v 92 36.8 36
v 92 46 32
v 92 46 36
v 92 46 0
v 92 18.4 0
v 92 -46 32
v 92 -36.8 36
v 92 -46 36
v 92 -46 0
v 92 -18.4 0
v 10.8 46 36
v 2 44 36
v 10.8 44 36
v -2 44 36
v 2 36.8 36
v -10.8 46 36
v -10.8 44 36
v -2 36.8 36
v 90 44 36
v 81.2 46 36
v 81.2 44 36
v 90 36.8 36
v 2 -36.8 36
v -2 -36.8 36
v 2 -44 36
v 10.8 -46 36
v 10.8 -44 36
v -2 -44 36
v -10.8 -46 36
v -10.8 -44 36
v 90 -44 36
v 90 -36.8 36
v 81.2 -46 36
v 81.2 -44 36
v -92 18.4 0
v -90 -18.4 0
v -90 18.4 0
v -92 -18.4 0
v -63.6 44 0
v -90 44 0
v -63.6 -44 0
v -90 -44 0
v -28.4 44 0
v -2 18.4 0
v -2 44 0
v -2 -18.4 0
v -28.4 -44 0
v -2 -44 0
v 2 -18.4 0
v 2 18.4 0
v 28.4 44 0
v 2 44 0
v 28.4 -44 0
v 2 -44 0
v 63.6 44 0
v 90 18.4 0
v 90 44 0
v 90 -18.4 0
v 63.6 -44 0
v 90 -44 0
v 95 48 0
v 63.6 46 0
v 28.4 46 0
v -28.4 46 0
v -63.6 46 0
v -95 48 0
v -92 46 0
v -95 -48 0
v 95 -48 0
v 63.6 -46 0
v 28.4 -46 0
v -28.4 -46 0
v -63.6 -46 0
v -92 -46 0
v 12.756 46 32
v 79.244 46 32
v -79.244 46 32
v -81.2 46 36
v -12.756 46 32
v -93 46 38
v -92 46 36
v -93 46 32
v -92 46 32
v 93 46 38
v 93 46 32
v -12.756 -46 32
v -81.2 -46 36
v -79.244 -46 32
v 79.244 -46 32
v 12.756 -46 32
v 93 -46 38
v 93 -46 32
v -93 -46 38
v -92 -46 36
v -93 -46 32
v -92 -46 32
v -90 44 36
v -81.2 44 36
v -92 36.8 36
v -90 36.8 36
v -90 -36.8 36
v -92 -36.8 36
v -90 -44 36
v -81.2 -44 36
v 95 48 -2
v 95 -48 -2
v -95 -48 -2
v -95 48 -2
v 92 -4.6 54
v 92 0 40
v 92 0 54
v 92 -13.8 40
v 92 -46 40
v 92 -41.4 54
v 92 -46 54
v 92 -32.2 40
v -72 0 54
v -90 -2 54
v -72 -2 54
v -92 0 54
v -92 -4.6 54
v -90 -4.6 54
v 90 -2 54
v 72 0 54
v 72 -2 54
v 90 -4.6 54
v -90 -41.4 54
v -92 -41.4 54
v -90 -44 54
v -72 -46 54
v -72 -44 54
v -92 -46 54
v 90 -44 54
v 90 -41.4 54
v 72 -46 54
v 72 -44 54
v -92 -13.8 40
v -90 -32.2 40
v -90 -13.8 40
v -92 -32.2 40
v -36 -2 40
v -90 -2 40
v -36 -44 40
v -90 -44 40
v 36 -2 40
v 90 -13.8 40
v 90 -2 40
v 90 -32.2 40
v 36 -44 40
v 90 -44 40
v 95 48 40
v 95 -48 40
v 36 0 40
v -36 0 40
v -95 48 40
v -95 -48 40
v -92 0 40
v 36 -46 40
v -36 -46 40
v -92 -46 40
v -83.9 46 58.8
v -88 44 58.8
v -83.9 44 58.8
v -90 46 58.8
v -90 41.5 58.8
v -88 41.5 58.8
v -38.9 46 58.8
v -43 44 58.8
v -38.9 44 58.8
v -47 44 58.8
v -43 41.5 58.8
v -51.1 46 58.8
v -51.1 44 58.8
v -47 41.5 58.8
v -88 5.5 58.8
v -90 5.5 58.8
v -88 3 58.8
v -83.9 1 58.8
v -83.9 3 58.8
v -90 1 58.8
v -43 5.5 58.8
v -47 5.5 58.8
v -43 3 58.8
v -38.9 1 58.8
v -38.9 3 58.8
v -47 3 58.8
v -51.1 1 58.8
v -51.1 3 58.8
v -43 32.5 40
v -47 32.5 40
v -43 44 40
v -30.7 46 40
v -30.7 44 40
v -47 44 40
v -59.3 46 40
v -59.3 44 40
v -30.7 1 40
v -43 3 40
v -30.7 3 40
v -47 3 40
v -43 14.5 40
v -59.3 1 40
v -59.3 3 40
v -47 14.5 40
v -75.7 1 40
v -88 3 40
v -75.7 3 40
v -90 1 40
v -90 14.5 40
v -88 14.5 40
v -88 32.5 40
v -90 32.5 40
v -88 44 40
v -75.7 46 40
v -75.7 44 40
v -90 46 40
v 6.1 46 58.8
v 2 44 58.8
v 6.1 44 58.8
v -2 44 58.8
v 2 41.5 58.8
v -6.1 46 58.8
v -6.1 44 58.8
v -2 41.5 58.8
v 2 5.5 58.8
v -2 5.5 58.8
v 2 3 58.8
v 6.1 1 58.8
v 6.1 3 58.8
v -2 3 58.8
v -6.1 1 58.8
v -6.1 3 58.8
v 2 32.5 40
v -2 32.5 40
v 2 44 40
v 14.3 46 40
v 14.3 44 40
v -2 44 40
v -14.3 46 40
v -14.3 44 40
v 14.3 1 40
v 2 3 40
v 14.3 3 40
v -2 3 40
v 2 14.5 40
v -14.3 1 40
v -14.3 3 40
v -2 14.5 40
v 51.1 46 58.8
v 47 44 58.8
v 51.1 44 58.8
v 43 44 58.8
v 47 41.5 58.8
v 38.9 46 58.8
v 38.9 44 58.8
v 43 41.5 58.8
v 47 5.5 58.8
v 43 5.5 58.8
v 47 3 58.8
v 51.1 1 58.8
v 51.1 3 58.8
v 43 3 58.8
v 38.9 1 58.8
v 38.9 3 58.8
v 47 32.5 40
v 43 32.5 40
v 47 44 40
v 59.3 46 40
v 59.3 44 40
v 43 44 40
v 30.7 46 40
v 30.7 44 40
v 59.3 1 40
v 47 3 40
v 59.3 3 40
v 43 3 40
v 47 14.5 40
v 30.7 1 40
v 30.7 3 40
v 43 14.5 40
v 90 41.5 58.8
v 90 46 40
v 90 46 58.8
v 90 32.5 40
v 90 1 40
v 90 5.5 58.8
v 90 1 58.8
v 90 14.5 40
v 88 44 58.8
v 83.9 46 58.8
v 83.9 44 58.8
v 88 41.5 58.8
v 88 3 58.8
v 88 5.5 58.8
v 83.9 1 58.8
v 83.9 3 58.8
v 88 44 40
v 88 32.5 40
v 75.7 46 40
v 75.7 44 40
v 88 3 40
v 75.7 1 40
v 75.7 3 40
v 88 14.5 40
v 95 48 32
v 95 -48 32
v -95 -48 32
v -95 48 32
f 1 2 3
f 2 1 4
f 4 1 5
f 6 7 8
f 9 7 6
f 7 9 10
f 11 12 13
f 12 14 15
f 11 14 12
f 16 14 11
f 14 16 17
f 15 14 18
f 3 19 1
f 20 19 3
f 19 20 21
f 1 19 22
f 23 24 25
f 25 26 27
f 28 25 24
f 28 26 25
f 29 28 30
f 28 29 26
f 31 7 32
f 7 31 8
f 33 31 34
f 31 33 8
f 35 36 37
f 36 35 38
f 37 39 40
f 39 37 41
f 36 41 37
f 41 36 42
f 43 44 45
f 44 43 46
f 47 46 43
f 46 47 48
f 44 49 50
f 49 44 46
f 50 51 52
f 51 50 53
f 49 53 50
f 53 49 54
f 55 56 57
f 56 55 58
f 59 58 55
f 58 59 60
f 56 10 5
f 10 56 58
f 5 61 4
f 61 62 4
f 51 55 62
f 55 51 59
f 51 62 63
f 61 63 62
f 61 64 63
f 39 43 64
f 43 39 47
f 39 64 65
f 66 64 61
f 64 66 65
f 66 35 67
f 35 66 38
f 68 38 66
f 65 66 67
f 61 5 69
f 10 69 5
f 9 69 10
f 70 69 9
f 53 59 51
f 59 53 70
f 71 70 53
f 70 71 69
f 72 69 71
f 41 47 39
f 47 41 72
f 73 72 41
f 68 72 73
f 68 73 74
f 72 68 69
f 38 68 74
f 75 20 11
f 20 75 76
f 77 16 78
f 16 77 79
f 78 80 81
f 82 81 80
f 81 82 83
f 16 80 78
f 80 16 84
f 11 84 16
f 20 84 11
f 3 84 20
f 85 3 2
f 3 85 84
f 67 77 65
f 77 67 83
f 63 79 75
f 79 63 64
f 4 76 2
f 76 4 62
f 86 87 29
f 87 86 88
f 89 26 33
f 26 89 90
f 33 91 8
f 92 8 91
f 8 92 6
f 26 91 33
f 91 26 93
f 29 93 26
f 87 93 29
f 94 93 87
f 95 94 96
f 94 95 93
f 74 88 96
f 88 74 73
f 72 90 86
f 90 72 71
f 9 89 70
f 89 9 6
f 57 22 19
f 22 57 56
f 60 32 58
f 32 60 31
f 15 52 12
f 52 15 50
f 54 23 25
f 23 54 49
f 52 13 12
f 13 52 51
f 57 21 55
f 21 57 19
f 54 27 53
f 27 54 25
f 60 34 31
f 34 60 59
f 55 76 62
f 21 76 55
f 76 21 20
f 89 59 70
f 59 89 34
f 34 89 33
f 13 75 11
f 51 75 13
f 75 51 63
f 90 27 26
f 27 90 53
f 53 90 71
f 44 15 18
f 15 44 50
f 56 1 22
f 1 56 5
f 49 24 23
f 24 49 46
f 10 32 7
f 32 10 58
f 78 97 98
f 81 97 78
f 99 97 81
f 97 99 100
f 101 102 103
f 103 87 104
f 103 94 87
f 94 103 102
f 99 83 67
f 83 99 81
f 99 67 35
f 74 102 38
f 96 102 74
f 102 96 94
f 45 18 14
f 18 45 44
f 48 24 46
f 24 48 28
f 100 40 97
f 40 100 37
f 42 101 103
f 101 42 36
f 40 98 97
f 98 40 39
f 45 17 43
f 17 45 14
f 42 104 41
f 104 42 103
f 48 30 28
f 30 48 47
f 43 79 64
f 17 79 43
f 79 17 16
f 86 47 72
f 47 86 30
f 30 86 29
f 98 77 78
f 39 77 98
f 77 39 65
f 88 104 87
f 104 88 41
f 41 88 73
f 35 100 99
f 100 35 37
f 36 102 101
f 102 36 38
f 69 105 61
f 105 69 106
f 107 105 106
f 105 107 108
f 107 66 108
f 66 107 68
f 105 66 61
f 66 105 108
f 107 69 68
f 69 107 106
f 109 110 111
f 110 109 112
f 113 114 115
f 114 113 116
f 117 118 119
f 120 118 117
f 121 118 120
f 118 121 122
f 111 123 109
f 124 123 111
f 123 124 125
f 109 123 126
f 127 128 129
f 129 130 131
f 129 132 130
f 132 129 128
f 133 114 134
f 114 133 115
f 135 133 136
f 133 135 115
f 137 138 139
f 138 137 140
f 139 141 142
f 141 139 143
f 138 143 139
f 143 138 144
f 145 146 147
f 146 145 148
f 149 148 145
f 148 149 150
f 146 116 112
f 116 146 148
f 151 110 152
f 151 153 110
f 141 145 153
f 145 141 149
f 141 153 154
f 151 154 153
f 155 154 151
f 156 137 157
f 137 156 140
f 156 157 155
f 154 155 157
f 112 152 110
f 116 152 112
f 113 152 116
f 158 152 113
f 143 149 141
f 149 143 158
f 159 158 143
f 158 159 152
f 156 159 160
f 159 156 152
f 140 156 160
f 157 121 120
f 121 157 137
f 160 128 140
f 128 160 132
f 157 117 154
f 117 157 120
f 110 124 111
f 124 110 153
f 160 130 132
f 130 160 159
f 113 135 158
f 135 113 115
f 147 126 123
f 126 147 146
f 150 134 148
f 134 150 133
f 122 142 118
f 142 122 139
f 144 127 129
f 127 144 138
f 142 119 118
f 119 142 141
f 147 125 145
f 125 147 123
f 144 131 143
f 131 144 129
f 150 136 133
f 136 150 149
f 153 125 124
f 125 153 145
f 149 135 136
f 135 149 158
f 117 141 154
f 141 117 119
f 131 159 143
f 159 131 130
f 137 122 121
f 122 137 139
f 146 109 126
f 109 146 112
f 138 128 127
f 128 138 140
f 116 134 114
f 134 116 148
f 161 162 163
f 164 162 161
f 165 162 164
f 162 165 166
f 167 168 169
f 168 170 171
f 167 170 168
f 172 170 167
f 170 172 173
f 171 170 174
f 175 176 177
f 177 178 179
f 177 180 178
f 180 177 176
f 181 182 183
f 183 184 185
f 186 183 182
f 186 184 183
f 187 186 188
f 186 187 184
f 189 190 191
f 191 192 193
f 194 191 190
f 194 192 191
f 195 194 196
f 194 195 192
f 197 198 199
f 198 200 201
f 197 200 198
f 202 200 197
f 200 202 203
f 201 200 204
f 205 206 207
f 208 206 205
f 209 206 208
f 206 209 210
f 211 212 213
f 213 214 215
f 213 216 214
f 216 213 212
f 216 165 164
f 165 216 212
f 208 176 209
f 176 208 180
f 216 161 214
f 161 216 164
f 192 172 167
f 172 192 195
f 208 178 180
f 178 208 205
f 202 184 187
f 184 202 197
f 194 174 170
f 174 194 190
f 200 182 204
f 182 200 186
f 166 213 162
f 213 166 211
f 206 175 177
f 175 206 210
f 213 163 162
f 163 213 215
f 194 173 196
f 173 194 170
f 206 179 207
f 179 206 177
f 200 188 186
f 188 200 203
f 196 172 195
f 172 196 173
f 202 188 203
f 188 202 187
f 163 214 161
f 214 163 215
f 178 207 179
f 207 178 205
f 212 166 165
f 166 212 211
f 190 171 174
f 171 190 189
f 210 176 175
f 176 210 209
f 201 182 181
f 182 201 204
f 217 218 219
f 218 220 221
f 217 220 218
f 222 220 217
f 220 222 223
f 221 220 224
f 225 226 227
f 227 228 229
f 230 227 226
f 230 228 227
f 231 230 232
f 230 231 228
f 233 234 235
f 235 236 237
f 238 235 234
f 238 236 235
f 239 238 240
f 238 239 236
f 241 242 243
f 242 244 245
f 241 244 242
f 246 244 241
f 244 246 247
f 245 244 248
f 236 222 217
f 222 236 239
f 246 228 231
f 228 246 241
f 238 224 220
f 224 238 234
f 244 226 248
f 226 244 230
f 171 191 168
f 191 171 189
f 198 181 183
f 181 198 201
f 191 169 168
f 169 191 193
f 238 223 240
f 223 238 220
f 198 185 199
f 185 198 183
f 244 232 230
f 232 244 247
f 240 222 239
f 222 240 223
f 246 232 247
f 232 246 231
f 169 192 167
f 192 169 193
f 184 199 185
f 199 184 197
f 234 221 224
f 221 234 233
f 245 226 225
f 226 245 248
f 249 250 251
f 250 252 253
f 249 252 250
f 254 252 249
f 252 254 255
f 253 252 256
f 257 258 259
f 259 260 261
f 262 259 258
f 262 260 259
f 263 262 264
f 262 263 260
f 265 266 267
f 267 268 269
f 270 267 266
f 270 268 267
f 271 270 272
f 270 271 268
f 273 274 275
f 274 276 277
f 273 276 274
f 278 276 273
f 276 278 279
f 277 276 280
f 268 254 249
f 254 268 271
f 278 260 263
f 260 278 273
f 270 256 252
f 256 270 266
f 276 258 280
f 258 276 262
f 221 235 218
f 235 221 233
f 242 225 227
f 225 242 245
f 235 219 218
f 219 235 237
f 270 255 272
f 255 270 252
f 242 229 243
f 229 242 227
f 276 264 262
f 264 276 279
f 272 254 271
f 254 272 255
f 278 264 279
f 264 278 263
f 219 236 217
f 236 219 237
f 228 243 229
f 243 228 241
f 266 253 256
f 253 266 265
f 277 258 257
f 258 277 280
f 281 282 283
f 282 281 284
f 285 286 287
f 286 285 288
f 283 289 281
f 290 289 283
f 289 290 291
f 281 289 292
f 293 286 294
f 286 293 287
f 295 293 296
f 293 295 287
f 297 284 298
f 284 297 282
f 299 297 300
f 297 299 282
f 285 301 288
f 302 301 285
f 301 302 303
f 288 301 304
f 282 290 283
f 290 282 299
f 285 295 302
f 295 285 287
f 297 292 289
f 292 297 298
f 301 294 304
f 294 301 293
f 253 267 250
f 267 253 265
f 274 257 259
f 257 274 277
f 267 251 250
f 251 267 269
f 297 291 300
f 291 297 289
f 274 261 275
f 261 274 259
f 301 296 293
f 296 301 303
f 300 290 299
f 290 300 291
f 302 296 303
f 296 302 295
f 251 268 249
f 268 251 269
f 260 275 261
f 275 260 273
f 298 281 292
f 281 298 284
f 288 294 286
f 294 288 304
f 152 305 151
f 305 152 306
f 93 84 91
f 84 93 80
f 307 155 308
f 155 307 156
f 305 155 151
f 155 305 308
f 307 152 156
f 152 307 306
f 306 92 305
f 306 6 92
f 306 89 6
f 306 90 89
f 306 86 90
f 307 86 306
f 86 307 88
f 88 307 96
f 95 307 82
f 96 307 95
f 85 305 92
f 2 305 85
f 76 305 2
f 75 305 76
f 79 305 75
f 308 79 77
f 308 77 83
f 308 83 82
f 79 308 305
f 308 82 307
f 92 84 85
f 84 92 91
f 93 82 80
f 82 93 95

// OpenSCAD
largeur_boite = 190;
longueur_boite = 190;
longueur_tuile = 88;
largeur_tuile = 88;
longueur_carte_perso = 41;
largeur_carte_perso = 41;
nb_cartes_perso = 28;
longueur_aide_jeu = 180;
largeur_aide_jeu = 42;
nb_aide_jeu = 5;
nb_tuiles = 30;
epaisseur_tuile = 2.4;
epaisseur = 2;
longueur_socle_pion = 15;
largeur_socle_pion = 10;
nb_pions = 20;
longueur_rangement_tuiles = largeur_boite;
largeur_rangement_tuiles = largeur_tuile+4*epaisseur;
longueur_rangement_pion = longueur_boite-largeur_rangement_tuiles;
nb_lignes = floor((longueur_rangement_pion-epaisseur)/(longueur_socle_pion+epaisseur));
nb_pions_par_ligne = nb_pions/nb_lignes;
largeur_rangement_pion = nb_pions_par_ligne*(largeur_socle_pion+epaisseur) + epaisseur;

module triangle_decoupe(longueur, largeur, hauteur){
	translate([-largeur/2,0,hauteur/2]) rotate([-90,0,0]) linear_extrude(height=longueur, center=true) polygon(points=[[0,0],[largeur,0],[largeur/2,5*hauteur/4]], paths=[[0,1,2]]);
}

module bloc_carte(longueur_carte, largeur_carte, hauteur_bloc, epaisseur){
	difference(){
		cube([longueur_carte+2*epaisseur, largeur_carte+2*epaisseur, hauteur_bloc], center=true);
		cube([longueur_carte, largeur_carte, 2*hauteur_bloc], center=true);
		triangle_decoupe(largeur_carte+3*epaisseur, longueur_carte, 2*hauteur_bloc);
		rotate([0,0,90]) triangle_decoupe(longueur_carte+3*epaisseur, largeur_carte+2*epaisseur, 2*hauteur_bloc);
	}
}

module rangement_tuiles(){
    hauteur_bloc = (nb_tuiles/2)*epaisseur_tuile;
	union(){
		translate([0,0,-epaisseur/2]) 
        cube([longueur_rangement_tuiles, largeur_rangement_tuiles, epaisseur],center=true);
		translate([(longueur_tuile+2*epaisseur)/2,0,hauteur_bloc/2]) bloc_carte(longueur_tuile, largeur_tuile, hauteur_bloc, epaisseur);
		translate([-(longueur_tuile+2*epaisseur)/2,0,hauteur_bloc/2]) bloc_carte(longueur_tuile, largeur_tuile, hauteur_bloc, epaisseur);
	}
}

module rangement_cartes(){
    translate([0,0,-epaisseur/2]) 
        cube([longueur_rangement_tuiles, largeur_rangement_tuiles, epaisseur],center=true);
    translate([0,2*epaisseur-(largeur_rangement_tuiles-largeur_aide_jeu)/2,(epaisseur+nb_aide_jeu*epaisseur_tuile)/2])
    bloc_carte(longueur_aide_jeu, largeur_aide_jeu, epaisseur+nb_aide_jeu*epaisseur_tuile, epaisseur);
    for(cartes =[0 : 1 :3]){
    translate([2.5*epaisseur-longueur_rangement_tuiles/2+(0.5+cartes)*(largeur_carte_perso+2*epaisseur),(largeur_rangement_tuiles-largeur_carte_perso)/2-2*epaisseur,(epaisseur+nb_cartes_perso/4*epaisseur_tuile)/2])
    bloc_carte(longueur_carte_perso, largeur_carte_perso, epaisseur+nb_cartes_perso/4*epaisseur_tuile, epaisseur);
    }
}

module support_rangement_cartes(){
    difference(){
        cube([longueur_rangement_tuiles, largeur_rangement_tuiles, 3*epaisseur],center=true);
        cube([longueur_rangement_tuiles-2*epaisseur, largeur_rangement_tuiles-2*epaisseur, 4*epaisseur],center=true);
    }
}

module rangement_pion_1(){
    longueur = 100;
    largeur = 80;
    difference(){
        cube([longueur_rangement_pion, largeur_rangement_pion, 3*epaisseur]);
        for(lignes =[0 : 1 : nb_lignes-1]){
        for(pions =[0 : 1 : nb_pions_par_ligne-1]){
        translate([epaisseur+lignes*(longueur_socle_pion+epaisseur),epaisseur+pions*(largeur_socle_pion+epaisseur),0.1+1.5*epaisseur])
        cube([longueur_socle_pion,largeur_socle_pion,2*epaisseur]);
        }
    }
    }
}


rangement_tuiles();
translate([0,0,40])
rangement_cartes();
translate([0,0,40-(5/2)*epaisseur])
support_rangement_cartes();
